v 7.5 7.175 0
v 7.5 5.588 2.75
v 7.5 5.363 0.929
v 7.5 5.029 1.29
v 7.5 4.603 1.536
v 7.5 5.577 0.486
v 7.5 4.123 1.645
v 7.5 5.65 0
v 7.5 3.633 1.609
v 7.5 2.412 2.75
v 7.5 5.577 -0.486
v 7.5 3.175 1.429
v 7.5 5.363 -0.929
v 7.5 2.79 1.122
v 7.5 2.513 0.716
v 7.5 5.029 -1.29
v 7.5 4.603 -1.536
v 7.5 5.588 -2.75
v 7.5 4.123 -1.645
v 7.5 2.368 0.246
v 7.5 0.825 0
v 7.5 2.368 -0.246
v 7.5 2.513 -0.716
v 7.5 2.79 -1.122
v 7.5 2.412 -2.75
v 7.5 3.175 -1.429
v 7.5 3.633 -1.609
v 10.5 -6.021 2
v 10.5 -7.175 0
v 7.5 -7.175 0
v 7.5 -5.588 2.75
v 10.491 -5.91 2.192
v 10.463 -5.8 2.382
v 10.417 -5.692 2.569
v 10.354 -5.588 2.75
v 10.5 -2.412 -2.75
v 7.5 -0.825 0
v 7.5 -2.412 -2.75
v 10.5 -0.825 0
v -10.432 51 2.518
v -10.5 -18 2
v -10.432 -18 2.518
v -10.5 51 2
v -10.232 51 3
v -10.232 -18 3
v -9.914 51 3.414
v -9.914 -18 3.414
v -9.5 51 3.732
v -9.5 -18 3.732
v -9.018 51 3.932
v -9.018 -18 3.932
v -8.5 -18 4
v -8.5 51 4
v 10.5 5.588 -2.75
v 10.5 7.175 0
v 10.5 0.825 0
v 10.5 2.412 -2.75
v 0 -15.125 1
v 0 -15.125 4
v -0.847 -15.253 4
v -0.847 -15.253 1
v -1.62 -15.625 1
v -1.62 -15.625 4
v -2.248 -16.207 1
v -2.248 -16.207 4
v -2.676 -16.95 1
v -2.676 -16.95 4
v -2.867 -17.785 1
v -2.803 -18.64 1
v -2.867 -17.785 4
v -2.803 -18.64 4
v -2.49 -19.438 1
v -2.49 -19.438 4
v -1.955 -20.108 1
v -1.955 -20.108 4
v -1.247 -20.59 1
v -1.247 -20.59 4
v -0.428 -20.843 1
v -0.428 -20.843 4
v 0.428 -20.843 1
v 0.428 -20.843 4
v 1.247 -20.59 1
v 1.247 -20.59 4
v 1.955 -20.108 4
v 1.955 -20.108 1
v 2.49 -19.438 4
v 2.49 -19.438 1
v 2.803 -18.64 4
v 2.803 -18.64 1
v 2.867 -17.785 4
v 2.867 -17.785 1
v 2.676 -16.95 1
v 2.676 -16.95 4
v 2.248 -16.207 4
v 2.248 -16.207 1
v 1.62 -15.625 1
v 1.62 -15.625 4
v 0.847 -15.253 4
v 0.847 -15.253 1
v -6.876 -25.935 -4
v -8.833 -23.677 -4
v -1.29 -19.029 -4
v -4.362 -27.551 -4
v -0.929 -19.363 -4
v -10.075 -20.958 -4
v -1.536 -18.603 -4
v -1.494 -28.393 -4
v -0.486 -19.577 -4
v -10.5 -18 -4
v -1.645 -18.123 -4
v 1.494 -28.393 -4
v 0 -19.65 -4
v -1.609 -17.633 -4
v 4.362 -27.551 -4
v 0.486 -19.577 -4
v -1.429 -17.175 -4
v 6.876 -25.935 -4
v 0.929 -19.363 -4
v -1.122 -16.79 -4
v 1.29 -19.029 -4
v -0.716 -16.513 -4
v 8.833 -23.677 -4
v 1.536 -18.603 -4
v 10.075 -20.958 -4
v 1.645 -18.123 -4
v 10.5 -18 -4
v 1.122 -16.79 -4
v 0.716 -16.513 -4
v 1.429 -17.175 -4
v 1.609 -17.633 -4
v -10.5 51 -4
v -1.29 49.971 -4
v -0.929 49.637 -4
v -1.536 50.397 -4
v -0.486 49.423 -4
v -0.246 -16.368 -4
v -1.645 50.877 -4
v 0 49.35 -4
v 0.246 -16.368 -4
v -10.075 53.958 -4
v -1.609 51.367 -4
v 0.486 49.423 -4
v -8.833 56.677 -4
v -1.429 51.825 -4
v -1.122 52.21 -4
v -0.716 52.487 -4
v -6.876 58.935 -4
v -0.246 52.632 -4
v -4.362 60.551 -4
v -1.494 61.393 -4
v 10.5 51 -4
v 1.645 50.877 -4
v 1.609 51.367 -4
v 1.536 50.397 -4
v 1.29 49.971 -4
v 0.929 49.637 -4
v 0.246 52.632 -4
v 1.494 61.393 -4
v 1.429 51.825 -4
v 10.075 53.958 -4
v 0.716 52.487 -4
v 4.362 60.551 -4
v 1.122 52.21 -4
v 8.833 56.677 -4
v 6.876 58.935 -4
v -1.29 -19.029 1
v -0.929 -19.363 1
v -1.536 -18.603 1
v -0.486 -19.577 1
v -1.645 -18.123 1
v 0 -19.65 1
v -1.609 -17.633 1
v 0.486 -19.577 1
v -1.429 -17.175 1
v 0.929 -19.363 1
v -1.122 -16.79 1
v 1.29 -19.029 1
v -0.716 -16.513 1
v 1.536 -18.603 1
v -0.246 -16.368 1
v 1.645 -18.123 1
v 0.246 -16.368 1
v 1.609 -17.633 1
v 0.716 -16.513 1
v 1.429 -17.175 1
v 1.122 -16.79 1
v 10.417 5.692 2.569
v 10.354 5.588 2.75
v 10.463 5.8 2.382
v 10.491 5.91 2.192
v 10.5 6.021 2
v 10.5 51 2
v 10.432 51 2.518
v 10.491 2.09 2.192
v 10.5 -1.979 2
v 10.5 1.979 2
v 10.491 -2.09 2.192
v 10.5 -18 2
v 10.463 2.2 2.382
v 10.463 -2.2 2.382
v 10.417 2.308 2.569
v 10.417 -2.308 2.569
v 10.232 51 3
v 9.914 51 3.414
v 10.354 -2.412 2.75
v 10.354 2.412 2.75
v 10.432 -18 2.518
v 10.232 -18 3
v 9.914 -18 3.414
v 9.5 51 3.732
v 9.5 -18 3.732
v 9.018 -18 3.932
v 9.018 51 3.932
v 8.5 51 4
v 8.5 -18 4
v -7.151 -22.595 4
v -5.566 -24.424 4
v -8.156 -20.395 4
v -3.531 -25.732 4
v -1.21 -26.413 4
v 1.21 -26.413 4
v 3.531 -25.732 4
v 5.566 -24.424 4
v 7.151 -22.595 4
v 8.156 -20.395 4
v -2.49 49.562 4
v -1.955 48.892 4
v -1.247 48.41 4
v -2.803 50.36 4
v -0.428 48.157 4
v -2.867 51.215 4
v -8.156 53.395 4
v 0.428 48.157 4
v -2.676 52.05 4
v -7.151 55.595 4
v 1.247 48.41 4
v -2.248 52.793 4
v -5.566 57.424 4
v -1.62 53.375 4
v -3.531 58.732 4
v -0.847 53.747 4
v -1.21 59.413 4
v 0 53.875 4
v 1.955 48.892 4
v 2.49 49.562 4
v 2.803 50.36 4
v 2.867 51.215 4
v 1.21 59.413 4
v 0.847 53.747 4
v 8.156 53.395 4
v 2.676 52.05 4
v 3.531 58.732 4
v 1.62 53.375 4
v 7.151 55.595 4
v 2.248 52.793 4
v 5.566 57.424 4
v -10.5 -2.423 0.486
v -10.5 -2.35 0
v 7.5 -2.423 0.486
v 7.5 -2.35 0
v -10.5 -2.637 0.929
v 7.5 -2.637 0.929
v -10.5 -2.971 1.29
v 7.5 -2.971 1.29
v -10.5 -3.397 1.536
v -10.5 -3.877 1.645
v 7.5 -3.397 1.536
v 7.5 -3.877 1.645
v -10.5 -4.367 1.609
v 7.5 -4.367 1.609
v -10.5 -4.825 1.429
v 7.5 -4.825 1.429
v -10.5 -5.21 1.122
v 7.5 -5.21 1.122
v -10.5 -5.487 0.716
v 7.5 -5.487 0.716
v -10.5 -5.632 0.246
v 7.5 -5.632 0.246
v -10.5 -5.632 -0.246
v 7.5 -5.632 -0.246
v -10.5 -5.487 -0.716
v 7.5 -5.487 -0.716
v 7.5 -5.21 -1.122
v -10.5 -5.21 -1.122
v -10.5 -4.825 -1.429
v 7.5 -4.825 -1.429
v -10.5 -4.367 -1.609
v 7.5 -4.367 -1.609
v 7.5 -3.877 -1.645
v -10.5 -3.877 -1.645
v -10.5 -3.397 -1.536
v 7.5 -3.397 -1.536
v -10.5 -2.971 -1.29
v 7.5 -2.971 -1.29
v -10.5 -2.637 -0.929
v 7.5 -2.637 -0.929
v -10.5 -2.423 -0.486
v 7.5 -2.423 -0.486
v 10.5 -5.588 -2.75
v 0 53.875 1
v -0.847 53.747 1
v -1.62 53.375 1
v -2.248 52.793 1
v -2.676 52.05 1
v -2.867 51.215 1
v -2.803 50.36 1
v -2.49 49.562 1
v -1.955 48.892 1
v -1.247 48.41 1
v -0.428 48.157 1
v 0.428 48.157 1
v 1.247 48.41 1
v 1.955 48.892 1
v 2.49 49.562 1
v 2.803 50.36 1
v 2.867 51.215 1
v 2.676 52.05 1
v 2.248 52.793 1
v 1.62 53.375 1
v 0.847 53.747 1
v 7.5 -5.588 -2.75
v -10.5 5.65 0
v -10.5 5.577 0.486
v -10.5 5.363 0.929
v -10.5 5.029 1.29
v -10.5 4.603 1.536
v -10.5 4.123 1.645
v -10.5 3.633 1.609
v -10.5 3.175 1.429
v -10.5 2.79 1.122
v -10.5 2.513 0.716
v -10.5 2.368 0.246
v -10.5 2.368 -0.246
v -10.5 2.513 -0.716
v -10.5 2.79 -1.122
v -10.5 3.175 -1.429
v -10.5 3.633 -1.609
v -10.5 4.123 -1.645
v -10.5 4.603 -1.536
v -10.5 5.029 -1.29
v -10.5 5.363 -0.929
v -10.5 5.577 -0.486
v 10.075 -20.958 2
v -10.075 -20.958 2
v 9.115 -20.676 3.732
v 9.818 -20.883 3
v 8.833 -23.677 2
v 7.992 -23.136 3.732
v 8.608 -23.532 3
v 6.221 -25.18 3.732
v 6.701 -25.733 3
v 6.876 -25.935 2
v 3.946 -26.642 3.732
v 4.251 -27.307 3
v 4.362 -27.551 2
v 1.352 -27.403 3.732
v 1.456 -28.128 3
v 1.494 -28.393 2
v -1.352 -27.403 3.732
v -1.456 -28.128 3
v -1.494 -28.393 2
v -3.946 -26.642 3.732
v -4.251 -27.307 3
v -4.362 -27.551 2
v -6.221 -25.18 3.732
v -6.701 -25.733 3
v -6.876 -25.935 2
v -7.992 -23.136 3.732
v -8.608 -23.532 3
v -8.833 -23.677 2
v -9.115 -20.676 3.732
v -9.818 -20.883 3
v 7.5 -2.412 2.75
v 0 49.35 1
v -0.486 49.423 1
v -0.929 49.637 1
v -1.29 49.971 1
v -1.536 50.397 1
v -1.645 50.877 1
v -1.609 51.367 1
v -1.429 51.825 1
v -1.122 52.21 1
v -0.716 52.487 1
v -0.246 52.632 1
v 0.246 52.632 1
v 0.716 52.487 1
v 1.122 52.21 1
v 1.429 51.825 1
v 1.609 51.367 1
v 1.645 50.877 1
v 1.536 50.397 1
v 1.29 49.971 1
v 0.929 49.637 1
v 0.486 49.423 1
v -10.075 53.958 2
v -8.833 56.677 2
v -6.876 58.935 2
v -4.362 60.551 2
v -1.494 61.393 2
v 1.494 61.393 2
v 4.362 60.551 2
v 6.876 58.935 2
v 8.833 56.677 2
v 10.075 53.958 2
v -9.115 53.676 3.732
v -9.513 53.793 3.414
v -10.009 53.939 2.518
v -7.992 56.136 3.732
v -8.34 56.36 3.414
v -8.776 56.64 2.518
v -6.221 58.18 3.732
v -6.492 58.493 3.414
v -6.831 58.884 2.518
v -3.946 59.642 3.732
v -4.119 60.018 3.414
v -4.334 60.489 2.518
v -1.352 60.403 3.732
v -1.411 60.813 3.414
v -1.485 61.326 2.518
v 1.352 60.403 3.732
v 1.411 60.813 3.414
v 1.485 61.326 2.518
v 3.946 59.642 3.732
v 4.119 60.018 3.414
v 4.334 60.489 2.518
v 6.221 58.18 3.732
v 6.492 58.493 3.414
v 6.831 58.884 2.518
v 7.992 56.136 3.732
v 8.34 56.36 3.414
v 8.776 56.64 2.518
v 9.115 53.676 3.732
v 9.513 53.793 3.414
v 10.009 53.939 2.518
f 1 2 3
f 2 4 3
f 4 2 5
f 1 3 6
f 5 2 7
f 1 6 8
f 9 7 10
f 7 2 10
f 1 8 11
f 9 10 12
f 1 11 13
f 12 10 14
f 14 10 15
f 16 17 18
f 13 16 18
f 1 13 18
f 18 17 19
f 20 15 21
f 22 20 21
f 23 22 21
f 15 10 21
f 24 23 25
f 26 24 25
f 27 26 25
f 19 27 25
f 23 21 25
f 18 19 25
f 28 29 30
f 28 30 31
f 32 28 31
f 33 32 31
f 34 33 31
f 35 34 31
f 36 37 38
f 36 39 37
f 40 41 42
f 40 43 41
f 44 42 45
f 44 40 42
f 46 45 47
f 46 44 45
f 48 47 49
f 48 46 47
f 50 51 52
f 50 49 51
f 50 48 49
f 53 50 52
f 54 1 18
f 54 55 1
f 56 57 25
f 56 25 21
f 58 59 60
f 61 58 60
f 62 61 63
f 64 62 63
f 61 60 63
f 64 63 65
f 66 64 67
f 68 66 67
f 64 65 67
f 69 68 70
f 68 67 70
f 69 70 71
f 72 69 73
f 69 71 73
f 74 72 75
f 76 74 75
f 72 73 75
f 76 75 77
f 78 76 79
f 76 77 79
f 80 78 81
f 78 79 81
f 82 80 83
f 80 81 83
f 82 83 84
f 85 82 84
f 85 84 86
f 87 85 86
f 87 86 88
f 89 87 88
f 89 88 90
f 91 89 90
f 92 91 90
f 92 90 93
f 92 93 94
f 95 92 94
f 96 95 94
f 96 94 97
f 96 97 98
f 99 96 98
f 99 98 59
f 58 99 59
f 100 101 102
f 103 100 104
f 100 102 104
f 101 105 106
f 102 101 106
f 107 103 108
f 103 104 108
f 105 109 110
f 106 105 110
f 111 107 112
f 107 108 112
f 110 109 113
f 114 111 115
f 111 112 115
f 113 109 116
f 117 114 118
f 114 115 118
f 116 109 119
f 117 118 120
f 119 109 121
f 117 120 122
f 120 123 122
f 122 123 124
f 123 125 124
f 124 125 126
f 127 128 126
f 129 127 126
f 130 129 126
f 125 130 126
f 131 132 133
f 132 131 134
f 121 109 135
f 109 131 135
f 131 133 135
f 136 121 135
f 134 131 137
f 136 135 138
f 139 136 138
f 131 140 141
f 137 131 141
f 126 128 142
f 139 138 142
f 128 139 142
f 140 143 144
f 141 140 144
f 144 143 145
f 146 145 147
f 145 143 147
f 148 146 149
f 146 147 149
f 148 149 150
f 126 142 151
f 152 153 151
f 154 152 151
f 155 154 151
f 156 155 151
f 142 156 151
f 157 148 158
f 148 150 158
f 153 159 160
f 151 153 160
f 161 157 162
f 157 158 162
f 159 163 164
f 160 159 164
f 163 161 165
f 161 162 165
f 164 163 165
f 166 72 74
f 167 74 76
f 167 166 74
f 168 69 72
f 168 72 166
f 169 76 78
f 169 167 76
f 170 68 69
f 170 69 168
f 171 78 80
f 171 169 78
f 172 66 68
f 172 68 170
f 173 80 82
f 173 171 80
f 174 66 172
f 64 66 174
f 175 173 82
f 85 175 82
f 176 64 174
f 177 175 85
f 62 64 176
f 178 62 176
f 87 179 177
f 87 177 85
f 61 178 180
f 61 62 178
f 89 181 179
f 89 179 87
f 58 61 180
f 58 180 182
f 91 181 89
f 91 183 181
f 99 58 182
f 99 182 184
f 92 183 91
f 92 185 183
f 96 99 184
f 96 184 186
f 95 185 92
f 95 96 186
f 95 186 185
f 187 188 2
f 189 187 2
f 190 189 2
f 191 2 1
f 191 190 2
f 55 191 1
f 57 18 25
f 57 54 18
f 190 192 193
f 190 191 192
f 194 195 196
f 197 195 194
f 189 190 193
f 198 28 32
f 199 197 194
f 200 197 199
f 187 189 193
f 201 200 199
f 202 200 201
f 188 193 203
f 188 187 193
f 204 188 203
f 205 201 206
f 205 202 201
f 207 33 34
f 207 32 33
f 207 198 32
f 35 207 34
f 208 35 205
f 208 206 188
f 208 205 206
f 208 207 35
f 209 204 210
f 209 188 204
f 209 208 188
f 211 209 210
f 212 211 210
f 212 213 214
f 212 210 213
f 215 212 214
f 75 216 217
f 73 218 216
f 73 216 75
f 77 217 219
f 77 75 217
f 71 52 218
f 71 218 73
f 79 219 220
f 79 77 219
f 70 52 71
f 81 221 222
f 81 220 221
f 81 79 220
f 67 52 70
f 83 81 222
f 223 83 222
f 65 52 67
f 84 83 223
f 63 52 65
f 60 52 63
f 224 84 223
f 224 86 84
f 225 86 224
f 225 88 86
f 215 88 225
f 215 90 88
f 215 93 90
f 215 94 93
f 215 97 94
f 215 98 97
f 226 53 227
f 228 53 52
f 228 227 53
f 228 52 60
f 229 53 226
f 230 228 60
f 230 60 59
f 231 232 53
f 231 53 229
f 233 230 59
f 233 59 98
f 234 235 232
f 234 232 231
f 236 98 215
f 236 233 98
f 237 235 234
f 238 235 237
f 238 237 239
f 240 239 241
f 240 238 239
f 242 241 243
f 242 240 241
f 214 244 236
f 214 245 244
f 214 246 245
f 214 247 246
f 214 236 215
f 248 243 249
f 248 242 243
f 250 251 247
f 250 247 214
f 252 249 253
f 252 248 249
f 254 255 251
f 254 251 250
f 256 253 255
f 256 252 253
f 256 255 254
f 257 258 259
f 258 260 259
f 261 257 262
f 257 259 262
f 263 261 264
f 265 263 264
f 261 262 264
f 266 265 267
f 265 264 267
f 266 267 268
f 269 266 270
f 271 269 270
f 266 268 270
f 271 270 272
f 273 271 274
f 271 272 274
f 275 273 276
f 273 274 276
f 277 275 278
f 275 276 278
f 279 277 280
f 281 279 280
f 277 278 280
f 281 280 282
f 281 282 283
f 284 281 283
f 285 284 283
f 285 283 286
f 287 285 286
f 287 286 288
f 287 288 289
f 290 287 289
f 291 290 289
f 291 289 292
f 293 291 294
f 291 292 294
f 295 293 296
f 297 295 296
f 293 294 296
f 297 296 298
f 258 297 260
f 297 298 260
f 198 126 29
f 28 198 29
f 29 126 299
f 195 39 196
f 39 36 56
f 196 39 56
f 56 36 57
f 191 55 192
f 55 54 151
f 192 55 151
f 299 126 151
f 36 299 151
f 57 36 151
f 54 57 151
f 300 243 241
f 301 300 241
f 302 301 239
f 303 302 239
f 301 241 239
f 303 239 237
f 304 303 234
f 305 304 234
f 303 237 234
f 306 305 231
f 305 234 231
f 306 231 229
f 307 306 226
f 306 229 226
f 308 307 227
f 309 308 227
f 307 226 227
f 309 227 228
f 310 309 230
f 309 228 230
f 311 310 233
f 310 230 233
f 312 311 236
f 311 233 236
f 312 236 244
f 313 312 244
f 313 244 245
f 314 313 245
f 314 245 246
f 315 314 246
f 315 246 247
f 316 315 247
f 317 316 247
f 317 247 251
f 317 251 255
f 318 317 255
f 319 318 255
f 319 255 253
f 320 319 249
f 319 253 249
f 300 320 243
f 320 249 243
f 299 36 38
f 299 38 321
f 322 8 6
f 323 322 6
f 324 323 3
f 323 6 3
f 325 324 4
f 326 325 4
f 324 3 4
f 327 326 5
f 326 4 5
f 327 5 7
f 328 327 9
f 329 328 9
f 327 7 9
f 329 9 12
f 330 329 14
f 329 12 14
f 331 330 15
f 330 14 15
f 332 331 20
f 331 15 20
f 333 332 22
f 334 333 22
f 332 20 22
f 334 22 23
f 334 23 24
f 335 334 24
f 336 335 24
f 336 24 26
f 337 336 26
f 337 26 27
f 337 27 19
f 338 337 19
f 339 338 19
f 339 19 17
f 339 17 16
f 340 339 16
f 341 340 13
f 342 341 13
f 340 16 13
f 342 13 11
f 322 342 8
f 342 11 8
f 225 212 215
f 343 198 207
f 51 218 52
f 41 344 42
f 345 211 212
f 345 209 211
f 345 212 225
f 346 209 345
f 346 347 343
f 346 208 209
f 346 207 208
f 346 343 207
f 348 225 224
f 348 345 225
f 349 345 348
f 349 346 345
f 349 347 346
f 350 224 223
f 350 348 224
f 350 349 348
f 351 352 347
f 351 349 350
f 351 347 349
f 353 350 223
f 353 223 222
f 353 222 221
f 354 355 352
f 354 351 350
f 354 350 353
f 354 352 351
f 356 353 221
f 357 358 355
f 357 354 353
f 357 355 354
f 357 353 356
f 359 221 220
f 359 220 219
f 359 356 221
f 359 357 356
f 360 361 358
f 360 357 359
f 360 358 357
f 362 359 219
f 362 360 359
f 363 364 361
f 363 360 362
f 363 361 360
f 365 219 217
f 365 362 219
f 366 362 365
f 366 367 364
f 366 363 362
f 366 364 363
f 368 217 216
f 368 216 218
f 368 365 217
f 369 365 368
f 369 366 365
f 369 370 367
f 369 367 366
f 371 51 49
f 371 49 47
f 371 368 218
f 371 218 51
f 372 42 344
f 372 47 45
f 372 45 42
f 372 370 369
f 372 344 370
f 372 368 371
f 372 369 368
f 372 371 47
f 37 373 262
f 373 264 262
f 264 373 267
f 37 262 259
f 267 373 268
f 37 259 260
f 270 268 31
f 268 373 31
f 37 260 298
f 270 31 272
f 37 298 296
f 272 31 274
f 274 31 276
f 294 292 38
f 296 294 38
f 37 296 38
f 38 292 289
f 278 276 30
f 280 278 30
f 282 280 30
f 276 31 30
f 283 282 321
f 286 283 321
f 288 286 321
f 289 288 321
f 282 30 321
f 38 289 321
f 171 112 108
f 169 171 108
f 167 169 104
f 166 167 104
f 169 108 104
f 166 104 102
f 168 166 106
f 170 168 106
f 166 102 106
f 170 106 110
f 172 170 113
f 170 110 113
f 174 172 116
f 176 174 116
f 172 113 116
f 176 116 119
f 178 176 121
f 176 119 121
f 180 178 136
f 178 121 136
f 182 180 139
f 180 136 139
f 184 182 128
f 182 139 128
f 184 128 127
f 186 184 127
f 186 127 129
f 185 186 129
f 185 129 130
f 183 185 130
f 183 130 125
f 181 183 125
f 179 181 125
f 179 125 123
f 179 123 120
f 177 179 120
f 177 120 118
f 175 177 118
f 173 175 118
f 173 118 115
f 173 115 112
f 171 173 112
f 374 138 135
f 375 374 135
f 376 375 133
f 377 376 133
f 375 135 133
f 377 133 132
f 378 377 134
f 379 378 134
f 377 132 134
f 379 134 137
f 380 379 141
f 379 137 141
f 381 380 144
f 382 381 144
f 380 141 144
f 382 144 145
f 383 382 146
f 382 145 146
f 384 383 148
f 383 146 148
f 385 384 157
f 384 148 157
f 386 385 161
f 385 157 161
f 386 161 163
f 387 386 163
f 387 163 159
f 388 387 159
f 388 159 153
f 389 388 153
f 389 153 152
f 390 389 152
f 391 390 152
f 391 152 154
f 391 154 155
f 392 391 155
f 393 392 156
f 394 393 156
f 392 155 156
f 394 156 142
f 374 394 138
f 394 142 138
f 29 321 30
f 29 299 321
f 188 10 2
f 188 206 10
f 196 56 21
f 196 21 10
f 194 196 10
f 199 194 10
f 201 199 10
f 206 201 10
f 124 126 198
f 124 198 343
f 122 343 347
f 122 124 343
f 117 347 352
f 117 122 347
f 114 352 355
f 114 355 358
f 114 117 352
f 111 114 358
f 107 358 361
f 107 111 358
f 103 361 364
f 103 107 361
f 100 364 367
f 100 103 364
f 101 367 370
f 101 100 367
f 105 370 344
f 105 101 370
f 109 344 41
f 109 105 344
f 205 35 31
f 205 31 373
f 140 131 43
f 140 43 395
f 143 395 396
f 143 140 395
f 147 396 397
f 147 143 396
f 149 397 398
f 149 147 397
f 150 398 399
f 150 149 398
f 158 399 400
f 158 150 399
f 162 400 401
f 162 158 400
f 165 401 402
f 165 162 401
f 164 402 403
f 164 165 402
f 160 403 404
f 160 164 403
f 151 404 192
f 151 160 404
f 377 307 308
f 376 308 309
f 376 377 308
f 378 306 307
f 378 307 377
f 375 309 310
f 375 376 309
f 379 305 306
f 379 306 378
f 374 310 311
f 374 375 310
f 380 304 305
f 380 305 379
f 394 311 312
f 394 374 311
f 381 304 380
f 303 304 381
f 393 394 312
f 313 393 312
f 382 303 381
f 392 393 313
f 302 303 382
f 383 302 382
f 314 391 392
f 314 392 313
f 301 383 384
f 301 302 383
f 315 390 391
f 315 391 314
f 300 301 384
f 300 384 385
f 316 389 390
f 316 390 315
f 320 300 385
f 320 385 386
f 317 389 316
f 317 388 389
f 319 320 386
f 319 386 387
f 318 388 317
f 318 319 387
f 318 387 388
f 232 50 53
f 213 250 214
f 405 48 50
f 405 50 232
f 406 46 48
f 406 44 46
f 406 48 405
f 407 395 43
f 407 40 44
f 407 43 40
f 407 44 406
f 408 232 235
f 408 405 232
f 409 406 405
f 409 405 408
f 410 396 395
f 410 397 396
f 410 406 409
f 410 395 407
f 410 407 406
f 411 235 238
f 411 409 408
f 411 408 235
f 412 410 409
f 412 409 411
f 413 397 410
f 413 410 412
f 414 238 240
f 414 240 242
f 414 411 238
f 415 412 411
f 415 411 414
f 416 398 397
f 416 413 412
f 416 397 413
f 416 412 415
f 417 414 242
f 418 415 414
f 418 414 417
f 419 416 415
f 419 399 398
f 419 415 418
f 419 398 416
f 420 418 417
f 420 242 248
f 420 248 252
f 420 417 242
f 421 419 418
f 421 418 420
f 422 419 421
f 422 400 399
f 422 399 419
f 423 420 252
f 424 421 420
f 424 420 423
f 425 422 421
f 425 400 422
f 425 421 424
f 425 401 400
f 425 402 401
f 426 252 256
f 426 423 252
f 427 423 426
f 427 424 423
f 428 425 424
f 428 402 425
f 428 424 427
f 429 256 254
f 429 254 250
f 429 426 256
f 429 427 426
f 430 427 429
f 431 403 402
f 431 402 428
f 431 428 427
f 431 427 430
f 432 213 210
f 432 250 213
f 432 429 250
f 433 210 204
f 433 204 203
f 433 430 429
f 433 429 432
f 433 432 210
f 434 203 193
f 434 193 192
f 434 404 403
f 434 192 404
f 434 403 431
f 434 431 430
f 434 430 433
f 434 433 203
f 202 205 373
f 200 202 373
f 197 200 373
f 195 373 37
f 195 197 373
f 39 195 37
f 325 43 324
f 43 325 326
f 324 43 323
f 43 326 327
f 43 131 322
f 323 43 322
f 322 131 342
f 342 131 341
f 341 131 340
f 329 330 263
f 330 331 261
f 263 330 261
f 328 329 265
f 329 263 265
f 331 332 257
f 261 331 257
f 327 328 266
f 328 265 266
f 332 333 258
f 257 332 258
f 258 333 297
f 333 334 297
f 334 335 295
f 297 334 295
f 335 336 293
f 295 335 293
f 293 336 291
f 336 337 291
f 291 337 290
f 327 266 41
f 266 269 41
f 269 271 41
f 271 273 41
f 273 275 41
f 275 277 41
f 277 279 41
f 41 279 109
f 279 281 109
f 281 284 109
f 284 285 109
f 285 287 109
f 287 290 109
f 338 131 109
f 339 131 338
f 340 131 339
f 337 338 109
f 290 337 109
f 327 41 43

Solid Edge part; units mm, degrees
sketch "Sketch1" plane through (0, 0, 0) normal (0, 0, 1) x (1, 0, 0)
  line L0 (-10.5, 51) -> (-10.5, -18)
  arc A0 (10.5, -18) -> (-10.5, -18) centre (0, -18) cw
  line L1 (10.5, -18) -> (10.5, 51)
  arc A1 (-10.5, 51) -> (10.5, 51) centre (0, 51) cw
  dimension "D1" = 21
  dimension "D2" = 51
  dimension "D3" = 18
extrude "Protrusion1" add sketch "Sketch1" along normal mid plane 8
sketch "Sketch2" plane through (0, 39.5, -4) normal (0, 0, -1) x (0, -1, 0)
  circle A0 centre (57.5, 0) radius 1.65
  circle A1 centre (-11.5, 0) radius 1.65
  dimension "D1" = 51
  dimension "D2" = 18
extrude "Cutout1" cut sketch "Sketch2" against normal up to next
sketch "Sketch3" plane through (0, -5.25, 4) normal (0, 0, 1) x (0, 1, 0)
  circle A0 centre (56.25, 0) radius 2.875
  circle A1 centre (-12.75, 0) radius 2.875
extrude "VaciadoExtruido_4" cut sketch "Sketch3" against normal blind 3
sketch "Sketch4" plane through (10.5, 16.5, 0) normal (1, 0, 0) x (0, 1, 0)
  circle A0 centre (-20.5, 0) radius 1.65
  circle A1 centre (-12.5, 0) radius 1.65
  dimension "D1" = 4
  dimension "D2" = 4
extrude "Cutout2" cut sketch "Sketch4" against normal through all
fillet "Redondeo_2" radius 2 4 edges at (0, -28.5, 4) (10.5, 16.5, 4) (0, 61.5, 4) (-10.5, 16.5, 4)
sketch "Sketch5" plane through (10.5, 16.5, -1) normal (1, 0, 0) x (0, -1, 0)
  line L0 (18.9123, 1.75) -> (22.0877, 1.75)
  line L1 (22.0877, 1.75) -> (23.6754, -1)
  line L2 (23.6754, -1) -> (22.0877, -3.75)
  line L3 (22.0877, -3.75) -> (18.9123, -3.75)
  line L4 (18.9123, -3.75) -> (17.3246, -1)
  line L5 (17.3246, -1) -> (18.9123, 1.75)
  line L6 (10.9123, 1.75) -> (14.0877, 1.75)
  line L7 (14.0877, 1.75) -> (15.6754, -1)
  line L8 (15.6754, -1) -> (14.0877, -3.75)
  line L9 (14.0877, -3.75) -> (10.9123, -3.75)
  line L10 (10.9123, -3.75) -> (9.3246, -1)
  line L11 (9.3246, -1) -> (10.9123, 1.75)
  dimension "D1" = 5.5
  dimension "D2" = 5.5
extrude "VaciadoExtruido_23" cut sketch "Sketch5" against normal blind 3
properties material "Abs 15"
